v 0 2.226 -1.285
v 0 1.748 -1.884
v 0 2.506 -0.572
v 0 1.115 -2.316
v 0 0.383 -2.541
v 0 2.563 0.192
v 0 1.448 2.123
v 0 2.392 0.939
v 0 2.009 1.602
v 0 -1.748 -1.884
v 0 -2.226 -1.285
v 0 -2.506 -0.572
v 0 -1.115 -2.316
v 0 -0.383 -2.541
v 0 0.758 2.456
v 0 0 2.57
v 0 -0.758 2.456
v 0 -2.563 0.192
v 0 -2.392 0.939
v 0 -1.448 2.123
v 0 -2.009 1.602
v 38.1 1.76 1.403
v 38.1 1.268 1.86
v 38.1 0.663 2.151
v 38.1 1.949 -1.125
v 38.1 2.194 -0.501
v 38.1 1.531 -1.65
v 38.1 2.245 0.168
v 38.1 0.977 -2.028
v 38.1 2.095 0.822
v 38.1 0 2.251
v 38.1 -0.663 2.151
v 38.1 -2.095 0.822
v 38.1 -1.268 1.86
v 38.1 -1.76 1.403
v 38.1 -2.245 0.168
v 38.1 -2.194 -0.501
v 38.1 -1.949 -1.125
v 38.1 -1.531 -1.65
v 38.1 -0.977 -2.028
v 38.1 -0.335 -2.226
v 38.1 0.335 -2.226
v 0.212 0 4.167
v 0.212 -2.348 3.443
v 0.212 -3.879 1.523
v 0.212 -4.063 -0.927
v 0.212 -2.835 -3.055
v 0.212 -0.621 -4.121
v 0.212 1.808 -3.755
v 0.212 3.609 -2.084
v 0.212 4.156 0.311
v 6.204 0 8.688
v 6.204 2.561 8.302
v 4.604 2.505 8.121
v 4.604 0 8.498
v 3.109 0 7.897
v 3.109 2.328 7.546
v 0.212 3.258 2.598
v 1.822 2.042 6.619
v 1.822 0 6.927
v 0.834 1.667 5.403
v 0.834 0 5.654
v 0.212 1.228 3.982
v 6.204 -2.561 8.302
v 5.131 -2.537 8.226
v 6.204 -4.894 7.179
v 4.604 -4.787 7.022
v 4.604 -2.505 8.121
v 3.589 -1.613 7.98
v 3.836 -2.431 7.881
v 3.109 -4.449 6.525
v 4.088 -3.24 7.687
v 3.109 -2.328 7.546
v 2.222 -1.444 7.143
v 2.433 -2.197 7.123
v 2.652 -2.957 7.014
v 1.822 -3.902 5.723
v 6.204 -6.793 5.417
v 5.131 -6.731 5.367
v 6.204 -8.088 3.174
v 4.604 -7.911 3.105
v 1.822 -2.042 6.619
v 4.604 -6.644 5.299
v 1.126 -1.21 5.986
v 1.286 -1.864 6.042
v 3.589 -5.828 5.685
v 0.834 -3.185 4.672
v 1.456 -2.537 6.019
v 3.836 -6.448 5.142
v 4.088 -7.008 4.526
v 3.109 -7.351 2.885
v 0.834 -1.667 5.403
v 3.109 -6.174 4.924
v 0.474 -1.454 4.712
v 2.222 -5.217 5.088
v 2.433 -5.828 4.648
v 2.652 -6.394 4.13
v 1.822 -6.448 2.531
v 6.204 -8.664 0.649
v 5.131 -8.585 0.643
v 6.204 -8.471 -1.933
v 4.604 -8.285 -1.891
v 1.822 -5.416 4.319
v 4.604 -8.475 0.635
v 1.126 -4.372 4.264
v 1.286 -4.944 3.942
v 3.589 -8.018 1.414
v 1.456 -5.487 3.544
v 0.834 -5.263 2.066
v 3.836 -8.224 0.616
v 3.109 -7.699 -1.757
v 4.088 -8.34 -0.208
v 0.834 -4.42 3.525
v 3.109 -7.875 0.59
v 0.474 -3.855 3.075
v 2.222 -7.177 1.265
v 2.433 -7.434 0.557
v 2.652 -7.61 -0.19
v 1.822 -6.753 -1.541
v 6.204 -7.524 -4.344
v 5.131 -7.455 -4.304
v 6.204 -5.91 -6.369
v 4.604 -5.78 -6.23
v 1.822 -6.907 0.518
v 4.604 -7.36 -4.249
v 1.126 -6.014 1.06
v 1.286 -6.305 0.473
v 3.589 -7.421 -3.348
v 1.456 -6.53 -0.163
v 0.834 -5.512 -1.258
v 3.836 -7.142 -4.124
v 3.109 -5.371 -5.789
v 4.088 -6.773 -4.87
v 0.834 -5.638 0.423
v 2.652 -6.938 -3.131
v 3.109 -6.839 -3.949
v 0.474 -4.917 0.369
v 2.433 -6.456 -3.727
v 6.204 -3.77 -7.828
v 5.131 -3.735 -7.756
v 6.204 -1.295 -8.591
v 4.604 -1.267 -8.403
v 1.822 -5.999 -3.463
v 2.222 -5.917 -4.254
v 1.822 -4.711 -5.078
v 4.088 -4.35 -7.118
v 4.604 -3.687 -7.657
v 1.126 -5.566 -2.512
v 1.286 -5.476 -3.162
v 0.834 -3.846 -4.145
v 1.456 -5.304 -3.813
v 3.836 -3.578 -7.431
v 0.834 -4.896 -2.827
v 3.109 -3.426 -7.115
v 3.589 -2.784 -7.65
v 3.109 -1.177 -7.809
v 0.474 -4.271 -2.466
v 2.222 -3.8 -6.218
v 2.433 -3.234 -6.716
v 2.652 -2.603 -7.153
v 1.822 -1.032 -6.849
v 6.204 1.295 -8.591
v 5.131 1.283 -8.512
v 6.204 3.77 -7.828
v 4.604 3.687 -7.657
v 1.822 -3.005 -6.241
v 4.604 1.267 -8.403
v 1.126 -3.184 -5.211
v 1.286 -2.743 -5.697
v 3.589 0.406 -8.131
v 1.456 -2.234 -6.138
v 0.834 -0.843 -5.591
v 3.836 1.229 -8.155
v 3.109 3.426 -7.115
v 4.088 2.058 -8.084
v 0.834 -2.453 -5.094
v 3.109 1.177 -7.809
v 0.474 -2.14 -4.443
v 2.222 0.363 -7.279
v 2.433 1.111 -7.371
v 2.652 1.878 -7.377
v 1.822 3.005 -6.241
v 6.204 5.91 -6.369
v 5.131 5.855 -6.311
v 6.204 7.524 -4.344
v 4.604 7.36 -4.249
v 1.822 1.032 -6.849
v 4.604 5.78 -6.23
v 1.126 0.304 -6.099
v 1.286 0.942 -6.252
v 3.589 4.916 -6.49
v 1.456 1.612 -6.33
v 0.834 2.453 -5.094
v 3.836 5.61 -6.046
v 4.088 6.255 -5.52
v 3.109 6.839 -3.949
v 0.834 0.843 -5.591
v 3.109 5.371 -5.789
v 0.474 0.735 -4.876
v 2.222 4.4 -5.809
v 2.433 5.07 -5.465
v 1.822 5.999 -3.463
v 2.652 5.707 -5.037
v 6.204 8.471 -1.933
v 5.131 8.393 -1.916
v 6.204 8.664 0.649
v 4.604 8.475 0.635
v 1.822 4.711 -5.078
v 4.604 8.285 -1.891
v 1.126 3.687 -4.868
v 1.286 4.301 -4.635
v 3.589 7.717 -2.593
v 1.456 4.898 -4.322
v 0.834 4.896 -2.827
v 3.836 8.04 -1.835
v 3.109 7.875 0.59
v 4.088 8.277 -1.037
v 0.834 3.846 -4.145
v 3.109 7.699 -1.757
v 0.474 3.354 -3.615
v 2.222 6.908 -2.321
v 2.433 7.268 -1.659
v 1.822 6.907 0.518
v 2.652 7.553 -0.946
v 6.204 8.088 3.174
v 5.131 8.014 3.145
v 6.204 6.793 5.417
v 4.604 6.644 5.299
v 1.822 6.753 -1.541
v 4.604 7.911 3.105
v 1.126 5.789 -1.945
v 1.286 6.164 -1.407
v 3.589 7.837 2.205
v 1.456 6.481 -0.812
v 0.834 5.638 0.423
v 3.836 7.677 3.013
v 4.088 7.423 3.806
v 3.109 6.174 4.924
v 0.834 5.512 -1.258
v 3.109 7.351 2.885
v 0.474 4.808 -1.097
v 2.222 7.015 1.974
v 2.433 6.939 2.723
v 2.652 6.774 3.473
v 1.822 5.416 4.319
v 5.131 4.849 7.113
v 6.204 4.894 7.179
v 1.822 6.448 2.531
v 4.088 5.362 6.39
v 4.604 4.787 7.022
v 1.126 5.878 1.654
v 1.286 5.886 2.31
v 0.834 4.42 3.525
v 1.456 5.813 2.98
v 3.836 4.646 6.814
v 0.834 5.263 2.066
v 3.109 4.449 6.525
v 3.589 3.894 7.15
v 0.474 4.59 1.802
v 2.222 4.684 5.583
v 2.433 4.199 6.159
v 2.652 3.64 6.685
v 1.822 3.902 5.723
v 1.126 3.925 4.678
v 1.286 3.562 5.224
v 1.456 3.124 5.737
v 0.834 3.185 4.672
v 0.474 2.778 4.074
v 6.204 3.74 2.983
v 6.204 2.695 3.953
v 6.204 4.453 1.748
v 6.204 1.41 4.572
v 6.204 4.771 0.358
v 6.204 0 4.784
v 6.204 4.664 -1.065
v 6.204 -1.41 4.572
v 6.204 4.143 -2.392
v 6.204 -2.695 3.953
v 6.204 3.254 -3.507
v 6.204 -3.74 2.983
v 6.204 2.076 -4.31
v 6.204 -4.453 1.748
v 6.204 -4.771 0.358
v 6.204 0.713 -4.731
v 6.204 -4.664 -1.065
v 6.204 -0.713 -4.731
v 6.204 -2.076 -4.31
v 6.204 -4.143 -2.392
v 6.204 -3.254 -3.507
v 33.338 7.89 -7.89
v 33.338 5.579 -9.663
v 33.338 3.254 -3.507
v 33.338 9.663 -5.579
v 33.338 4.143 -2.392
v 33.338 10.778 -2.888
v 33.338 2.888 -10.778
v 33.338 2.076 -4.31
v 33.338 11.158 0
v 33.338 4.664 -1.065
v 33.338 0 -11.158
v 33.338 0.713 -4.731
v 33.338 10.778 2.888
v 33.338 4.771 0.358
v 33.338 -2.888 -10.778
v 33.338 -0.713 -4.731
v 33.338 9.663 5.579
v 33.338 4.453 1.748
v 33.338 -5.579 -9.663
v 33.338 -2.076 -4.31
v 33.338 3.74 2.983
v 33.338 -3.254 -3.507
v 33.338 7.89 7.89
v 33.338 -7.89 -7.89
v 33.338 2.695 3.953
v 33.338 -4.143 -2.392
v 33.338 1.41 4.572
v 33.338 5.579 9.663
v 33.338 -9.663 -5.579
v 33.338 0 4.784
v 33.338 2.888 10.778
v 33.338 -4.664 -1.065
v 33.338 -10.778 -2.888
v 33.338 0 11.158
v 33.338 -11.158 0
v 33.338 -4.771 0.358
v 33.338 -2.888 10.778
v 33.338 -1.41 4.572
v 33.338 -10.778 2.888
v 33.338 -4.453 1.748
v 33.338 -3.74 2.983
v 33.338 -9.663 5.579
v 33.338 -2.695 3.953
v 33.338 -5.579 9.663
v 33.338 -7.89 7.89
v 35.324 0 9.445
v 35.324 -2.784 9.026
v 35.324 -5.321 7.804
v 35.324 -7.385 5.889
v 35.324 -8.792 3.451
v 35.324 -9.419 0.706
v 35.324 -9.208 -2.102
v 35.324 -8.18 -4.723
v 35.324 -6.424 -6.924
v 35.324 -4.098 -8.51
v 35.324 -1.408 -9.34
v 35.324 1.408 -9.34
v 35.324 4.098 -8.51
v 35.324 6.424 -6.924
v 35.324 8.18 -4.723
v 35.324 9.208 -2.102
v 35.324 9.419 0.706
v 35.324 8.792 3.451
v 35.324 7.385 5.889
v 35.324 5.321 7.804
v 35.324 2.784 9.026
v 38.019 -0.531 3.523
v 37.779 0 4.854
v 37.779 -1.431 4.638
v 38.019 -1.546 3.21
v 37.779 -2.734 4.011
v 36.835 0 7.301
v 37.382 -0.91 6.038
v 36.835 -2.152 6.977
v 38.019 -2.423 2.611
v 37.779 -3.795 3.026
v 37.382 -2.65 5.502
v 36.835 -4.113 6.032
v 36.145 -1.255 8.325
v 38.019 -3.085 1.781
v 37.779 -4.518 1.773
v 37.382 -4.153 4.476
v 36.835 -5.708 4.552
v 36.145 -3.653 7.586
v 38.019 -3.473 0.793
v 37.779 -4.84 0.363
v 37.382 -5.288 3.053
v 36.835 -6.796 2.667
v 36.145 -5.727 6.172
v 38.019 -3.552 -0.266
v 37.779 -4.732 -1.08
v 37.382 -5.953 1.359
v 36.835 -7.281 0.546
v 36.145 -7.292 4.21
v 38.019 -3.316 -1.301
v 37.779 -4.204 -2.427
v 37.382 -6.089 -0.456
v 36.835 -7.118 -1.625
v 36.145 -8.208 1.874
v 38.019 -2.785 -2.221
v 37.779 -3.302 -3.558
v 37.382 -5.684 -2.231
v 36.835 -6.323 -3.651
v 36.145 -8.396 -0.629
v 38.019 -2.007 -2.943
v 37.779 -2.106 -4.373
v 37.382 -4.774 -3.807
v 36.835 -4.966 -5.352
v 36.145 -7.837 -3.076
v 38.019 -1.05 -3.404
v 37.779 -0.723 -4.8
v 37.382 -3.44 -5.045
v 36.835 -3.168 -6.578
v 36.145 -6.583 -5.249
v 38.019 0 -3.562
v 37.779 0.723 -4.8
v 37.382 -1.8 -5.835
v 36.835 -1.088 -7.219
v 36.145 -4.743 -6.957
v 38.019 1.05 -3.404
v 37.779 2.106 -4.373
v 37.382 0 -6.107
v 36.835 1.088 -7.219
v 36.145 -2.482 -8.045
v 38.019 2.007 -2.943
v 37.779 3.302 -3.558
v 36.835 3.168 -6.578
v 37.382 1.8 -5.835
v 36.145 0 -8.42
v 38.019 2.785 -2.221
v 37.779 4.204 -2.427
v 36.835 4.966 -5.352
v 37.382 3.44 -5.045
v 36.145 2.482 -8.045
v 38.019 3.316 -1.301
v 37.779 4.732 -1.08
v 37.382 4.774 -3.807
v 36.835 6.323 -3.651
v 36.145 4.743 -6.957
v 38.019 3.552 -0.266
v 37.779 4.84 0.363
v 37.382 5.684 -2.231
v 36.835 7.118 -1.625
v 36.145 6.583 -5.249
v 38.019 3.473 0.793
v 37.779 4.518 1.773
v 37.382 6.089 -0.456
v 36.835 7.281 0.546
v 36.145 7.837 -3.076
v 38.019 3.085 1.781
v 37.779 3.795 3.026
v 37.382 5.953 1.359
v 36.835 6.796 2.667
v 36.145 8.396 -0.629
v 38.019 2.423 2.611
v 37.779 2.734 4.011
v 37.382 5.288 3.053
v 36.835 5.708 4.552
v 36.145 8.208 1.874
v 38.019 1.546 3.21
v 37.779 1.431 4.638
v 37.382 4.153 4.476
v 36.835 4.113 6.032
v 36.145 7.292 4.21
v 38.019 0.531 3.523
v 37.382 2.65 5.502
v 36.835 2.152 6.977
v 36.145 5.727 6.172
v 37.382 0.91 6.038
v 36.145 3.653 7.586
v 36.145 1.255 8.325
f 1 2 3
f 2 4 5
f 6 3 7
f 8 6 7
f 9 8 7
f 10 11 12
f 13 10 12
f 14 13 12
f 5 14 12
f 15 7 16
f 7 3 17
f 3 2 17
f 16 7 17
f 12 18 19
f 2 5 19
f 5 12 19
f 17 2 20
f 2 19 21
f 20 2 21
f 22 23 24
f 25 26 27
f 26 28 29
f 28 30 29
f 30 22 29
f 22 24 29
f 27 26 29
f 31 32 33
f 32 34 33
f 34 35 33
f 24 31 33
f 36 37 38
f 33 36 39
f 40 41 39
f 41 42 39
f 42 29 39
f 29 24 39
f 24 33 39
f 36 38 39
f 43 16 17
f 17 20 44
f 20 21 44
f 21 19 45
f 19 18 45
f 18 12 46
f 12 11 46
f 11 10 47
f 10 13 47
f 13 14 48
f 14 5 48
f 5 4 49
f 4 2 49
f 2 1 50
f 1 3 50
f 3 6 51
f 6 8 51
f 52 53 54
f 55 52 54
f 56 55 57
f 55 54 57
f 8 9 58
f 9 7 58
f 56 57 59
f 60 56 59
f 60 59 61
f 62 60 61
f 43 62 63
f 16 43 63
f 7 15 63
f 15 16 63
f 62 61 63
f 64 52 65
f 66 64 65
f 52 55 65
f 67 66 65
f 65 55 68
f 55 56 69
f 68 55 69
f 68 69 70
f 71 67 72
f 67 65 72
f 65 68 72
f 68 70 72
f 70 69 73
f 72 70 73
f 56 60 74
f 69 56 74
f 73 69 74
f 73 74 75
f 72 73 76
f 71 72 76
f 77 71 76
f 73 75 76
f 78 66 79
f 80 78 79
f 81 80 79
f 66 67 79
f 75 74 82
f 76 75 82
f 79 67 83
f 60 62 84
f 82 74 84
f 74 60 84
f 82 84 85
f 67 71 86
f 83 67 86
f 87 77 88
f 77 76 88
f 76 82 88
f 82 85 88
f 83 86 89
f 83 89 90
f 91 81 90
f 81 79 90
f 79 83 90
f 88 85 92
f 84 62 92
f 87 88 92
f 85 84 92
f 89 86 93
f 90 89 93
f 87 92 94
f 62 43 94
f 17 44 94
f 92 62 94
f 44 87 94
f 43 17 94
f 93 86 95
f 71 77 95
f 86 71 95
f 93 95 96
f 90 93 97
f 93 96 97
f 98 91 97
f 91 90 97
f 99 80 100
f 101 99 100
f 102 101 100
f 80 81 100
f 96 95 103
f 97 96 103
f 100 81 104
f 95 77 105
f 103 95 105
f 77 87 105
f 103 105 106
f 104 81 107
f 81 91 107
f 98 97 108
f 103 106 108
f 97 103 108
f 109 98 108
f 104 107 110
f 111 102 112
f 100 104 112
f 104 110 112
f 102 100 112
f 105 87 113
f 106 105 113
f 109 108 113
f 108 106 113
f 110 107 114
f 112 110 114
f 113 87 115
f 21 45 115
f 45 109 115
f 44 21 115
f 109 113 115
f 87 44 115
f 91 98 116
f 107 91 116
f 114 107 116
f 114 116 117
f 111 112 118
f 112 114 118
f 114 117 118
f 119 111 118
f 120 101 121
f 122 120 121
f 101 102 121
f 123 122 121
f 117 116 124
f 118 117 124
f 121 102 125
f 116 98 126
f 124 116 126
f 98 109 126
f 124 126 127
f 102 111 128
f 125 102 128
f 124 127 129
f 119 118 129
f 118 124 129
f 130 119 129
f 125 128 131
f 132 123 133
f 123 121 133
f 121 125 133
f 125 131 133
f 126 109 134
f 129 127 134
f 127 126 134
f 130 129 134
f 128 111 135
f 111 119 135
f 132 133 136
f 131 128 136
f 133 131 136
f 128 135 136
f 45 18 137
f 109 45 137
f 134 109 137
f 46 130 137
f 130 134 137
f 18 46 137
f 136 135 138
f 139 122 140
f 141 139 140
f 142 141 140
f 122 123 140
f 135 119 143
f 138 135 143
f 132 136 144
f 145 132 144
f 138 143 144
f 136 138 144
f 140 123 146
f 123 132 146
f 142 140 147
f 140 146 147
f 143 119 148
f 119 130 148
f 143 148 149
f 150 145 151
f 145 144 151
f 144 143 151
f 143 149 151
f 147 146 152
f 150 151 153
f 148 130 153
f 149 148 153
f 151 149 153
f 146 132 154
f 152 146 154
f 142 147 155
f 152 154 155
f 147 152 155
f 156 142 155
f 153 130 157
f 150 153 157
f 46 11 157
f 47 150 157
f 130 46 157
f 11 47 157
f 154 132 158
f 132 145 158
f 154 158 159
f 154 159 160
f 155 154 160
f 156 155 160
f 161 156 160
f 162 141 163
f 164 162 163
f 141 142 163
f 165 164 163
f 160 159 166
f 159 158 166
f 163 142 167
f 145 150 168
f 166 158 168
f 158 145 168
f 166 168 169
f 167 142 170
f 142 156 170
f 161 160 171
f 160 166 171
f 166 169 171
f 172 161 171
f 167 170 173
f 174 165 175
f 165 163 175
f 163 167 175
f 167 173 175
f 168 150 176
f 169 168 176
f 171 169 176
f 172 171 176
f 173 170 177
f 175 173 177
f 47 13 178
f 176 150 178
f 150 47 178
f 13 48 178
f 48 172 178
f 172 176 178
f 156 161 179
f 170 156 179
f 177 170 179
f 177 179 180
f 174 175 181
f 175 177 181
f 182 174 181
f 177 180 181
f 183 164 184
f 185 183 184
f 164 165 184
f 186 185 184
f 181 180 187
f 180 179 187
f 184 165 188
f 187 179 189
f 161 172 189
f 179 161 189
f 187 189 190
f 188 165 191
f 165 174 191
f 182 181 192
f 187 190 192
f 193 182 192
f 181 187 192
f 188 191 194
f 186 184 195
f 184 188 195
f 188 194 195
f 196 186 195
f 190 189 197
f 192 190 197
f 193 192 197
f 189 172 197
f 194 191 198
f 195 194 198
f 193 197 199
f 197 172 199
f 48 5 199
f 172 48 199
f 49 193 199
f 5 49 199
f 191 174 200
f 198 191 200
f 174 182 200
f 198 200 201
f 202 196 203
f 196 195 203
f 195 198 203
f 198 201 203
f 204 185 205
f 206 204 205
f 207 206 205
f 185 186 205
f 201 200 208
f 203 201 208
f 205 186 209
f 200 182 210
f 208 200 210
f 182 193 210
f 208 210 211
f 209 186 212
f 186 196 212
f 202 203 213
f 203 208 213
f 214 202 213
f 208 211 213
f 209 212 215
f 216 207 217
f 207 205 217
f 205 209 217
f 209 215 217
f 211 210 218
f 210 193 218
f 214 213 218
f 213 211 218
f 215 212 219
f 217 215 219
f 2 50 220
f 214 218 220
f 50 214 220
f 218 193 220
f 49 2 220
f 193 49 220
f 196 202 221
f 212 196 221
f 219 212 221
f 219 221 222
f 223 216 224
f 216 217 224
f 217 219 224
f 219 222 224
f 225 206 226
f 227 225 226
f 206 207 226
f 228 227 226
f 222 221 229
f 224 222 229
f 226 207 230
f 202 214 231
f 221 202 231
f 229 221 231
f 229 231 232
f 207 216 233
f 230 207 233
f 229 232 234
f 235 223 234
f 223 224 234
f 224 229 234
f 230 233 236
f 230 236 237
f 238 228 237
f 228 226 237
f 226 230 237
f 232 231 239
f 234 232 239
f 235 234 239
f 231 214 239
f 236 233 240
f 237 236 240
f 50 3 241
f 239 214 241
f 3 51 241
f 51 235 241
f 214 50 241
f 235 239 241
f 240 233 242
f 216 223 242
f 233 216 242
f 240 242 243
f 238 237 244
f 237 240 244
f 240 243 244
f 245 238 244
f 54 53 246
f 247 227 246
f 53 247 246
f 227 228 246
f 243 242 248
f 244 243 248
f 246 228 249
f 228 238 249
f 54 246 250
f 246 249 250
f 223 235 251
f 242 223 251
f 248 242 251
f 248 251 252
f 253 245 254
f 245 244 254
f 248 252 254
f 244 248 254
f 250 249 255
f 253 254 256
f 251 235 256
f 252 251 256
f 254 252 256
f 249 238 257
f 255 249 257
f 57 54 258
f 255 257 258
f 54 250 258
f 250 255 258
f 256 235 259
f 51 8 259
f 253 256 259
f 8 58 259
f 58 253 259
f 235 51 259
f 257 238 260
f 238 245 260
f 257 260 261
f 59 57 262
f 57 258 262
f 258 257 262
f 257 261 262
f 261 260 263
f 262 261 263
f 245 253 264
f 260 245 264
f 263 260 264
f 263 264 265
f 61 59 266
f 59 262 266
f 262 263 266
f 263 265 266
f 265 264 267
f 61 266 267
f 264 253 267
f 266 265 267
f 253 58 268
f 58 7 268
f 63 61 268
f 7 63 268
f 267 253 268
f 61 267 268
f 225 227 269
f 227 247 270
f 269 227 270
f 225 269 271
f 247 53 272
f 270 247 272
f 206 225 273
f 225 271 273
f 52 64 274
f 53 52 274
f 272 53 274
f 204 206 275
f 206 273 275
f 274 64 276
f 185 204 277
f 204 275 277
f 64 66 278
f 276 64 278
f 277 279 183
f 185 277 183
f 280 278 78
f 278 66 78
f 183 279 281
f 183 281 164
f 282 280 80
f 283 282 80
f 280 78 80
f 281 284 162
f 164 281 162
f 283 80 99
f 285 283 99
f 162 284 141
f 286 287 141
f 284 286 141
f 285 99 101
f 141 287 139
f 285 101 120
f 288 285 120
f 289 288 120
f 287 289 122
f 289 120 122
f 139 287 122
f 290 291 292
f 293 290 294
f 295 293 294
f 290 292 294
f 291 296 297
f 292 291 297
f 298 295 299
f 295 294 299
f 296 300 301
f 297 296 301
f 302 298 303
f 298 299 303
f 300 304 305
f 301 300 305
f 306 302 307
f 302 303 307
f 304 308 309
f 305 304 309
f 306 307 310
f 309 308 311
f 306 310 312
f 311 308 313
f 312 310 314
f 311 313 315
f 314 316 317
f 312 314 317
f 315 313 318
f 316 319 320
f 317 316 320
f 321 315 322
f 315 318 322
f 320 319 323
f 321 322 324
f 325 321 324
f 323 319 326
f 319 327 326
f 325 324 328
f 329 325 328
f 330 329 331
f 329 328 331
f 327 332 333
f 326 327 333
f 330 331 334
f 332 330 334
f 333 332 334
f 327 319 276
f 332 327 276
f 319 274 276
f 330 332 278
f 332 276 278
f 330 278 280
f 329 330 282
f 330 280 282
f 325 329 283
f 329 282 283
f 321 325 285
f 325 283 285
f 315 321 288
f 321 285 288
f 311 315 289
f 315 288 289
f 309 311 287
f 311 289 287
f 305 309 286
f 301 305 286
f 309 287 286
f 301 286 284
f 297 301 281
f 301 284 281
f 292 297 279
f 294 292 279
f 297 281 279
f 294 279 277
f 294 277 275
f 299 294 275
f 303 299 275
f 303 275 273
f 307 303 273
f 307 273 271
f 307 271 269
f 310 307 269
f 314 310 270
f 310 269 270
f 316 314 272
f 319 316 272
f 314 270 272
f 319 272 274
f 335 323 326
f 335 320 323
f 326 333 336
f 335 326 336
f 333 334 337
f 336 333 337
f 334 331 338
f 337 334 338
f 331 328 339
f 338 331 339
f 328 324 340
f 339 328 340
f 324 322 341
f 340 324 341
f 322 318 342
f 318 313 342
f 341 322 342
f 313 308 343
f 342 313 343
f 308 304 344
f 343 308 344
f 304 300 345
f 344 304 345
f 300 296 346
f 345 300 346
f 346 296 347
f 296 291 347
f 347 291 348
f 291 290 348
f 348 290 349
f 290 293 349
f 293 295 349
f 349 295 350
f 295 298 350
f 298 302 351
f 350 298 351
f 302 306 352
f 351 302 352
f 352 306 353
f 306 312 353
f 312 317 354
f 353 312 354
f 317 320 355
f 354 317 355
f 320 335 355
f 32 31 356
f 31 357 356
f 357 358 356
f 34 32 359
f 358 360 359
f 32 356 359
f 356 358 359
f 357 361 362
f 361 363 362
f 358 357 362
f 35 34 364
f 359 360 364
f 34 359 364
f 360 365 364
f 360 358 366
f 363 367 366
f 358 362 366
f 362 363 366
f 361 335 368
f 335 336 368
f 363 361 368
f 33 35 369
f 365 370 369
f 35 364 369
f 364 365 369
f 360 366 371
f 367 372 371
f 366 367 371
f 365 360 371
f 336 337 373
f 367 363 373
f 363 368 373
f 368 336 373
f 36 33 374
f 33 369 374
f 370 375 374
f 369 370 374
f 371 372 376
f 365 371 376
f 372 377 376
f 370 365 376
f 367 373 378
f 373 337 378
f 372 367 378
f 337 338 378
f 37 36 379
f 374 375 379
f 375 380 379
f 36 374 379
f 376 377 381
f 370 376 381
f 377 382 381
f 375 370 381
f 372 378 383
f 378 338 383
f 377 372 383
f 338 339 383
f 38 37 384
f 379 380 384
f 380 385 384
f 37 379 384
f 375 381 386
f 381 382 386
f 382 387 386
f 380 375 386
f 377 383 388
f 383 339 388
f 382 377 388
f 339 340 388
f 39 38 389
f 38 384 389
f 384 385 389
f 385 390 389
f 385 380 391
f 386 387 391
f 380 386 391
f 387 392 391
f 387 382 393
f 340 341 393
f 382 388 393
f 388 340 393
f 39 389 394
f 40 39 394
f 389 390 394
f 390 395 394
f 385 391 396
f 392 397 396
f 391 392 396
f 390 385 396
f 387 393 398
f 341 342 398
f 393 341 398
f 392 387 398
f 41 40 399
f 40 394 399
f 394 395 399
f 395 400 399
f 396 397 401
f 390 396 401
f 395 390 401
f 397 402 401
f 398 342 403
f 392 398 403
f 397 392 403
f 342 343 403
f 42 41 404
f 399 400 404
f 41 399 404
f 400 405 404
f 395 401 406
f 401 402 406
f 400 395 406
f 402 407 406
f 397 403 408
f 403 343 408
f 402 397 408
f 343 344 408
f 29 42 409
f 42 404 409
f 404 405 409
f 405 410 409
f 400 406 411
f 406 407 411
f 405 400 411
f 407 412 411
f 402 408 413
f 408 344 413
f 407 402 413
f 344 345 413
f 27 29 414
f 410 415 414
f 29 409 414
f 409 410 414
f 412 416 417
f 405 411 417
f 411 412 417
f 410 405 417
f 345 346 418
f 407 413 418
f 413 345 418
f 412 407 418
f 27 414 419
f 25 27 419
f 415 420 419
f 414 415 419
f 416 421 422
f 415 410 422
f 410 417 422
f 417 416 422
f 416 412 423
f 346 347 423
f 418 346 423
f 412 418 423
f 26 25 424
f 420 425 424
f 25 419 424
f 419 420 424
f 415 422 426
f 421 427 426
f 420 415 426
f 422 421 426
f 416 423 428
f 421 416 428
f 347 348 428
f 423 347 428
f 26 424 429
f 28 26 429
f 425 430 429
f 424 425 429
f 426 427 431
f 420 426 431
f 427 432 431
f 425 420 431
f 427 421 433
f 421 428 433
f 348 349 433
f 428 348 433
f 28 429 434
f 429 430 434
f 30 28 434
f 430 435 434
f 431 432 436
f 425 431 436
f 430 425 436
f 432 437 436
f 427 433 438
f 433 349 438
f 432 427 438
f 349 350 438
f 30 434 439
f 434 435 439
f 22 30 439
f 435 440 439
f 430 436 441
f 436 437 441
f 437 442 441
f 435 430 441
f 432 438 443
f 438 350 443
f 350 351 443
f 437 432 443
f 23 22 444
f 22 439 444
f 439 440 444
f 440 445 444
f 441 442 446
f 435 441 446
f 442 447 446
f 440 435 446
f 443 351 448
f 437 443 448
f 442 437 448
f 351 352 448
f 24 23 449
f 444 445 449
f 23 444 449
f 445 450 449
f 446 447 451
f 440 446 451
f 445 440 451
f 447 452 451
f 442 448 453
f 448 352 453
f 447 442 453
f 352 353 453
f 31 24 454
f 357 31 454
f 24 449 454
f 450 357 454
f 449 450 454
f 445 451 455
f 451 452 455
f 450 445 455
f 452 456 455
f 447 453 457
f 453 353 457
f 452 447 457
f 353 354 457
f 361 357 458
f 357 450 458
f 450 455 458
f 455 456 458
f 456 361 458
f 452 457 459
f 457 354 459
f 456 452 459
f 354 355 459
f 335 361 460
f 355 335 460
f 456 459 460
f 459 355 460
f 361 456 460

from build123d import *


with BuildPart() as f1:
    # F0 (on Front) → F1 (revolve)
    with BuildSketch(Plane.XZ):
        with BuildLine():
            Line((0, 2.570061), (0, 0))
            Line((0, 0), (38.1, 0))
            Line((38.1, 0), (38.1, 2.250872))
            ThreePointArc((38.1, 2.250872), (36.834626, 7.301015), (33.3375, 11.157857))
            Line((33.3375, 11.157857), (33.3375, 4.784073))
            Line((33.3375, 4.784073), (6.203805, 4.784073))
            Line((6.203805, 4.784073), (6.203805, 8.688359))
            ThreePointArc((6.203805, 8.688359), (1.822309, 6.926687), (0, 2.570061))
        make_face()
    revolve(axis=Axis((19.05, 0, 0), (1, 0, 0)))


solid = f1.part
